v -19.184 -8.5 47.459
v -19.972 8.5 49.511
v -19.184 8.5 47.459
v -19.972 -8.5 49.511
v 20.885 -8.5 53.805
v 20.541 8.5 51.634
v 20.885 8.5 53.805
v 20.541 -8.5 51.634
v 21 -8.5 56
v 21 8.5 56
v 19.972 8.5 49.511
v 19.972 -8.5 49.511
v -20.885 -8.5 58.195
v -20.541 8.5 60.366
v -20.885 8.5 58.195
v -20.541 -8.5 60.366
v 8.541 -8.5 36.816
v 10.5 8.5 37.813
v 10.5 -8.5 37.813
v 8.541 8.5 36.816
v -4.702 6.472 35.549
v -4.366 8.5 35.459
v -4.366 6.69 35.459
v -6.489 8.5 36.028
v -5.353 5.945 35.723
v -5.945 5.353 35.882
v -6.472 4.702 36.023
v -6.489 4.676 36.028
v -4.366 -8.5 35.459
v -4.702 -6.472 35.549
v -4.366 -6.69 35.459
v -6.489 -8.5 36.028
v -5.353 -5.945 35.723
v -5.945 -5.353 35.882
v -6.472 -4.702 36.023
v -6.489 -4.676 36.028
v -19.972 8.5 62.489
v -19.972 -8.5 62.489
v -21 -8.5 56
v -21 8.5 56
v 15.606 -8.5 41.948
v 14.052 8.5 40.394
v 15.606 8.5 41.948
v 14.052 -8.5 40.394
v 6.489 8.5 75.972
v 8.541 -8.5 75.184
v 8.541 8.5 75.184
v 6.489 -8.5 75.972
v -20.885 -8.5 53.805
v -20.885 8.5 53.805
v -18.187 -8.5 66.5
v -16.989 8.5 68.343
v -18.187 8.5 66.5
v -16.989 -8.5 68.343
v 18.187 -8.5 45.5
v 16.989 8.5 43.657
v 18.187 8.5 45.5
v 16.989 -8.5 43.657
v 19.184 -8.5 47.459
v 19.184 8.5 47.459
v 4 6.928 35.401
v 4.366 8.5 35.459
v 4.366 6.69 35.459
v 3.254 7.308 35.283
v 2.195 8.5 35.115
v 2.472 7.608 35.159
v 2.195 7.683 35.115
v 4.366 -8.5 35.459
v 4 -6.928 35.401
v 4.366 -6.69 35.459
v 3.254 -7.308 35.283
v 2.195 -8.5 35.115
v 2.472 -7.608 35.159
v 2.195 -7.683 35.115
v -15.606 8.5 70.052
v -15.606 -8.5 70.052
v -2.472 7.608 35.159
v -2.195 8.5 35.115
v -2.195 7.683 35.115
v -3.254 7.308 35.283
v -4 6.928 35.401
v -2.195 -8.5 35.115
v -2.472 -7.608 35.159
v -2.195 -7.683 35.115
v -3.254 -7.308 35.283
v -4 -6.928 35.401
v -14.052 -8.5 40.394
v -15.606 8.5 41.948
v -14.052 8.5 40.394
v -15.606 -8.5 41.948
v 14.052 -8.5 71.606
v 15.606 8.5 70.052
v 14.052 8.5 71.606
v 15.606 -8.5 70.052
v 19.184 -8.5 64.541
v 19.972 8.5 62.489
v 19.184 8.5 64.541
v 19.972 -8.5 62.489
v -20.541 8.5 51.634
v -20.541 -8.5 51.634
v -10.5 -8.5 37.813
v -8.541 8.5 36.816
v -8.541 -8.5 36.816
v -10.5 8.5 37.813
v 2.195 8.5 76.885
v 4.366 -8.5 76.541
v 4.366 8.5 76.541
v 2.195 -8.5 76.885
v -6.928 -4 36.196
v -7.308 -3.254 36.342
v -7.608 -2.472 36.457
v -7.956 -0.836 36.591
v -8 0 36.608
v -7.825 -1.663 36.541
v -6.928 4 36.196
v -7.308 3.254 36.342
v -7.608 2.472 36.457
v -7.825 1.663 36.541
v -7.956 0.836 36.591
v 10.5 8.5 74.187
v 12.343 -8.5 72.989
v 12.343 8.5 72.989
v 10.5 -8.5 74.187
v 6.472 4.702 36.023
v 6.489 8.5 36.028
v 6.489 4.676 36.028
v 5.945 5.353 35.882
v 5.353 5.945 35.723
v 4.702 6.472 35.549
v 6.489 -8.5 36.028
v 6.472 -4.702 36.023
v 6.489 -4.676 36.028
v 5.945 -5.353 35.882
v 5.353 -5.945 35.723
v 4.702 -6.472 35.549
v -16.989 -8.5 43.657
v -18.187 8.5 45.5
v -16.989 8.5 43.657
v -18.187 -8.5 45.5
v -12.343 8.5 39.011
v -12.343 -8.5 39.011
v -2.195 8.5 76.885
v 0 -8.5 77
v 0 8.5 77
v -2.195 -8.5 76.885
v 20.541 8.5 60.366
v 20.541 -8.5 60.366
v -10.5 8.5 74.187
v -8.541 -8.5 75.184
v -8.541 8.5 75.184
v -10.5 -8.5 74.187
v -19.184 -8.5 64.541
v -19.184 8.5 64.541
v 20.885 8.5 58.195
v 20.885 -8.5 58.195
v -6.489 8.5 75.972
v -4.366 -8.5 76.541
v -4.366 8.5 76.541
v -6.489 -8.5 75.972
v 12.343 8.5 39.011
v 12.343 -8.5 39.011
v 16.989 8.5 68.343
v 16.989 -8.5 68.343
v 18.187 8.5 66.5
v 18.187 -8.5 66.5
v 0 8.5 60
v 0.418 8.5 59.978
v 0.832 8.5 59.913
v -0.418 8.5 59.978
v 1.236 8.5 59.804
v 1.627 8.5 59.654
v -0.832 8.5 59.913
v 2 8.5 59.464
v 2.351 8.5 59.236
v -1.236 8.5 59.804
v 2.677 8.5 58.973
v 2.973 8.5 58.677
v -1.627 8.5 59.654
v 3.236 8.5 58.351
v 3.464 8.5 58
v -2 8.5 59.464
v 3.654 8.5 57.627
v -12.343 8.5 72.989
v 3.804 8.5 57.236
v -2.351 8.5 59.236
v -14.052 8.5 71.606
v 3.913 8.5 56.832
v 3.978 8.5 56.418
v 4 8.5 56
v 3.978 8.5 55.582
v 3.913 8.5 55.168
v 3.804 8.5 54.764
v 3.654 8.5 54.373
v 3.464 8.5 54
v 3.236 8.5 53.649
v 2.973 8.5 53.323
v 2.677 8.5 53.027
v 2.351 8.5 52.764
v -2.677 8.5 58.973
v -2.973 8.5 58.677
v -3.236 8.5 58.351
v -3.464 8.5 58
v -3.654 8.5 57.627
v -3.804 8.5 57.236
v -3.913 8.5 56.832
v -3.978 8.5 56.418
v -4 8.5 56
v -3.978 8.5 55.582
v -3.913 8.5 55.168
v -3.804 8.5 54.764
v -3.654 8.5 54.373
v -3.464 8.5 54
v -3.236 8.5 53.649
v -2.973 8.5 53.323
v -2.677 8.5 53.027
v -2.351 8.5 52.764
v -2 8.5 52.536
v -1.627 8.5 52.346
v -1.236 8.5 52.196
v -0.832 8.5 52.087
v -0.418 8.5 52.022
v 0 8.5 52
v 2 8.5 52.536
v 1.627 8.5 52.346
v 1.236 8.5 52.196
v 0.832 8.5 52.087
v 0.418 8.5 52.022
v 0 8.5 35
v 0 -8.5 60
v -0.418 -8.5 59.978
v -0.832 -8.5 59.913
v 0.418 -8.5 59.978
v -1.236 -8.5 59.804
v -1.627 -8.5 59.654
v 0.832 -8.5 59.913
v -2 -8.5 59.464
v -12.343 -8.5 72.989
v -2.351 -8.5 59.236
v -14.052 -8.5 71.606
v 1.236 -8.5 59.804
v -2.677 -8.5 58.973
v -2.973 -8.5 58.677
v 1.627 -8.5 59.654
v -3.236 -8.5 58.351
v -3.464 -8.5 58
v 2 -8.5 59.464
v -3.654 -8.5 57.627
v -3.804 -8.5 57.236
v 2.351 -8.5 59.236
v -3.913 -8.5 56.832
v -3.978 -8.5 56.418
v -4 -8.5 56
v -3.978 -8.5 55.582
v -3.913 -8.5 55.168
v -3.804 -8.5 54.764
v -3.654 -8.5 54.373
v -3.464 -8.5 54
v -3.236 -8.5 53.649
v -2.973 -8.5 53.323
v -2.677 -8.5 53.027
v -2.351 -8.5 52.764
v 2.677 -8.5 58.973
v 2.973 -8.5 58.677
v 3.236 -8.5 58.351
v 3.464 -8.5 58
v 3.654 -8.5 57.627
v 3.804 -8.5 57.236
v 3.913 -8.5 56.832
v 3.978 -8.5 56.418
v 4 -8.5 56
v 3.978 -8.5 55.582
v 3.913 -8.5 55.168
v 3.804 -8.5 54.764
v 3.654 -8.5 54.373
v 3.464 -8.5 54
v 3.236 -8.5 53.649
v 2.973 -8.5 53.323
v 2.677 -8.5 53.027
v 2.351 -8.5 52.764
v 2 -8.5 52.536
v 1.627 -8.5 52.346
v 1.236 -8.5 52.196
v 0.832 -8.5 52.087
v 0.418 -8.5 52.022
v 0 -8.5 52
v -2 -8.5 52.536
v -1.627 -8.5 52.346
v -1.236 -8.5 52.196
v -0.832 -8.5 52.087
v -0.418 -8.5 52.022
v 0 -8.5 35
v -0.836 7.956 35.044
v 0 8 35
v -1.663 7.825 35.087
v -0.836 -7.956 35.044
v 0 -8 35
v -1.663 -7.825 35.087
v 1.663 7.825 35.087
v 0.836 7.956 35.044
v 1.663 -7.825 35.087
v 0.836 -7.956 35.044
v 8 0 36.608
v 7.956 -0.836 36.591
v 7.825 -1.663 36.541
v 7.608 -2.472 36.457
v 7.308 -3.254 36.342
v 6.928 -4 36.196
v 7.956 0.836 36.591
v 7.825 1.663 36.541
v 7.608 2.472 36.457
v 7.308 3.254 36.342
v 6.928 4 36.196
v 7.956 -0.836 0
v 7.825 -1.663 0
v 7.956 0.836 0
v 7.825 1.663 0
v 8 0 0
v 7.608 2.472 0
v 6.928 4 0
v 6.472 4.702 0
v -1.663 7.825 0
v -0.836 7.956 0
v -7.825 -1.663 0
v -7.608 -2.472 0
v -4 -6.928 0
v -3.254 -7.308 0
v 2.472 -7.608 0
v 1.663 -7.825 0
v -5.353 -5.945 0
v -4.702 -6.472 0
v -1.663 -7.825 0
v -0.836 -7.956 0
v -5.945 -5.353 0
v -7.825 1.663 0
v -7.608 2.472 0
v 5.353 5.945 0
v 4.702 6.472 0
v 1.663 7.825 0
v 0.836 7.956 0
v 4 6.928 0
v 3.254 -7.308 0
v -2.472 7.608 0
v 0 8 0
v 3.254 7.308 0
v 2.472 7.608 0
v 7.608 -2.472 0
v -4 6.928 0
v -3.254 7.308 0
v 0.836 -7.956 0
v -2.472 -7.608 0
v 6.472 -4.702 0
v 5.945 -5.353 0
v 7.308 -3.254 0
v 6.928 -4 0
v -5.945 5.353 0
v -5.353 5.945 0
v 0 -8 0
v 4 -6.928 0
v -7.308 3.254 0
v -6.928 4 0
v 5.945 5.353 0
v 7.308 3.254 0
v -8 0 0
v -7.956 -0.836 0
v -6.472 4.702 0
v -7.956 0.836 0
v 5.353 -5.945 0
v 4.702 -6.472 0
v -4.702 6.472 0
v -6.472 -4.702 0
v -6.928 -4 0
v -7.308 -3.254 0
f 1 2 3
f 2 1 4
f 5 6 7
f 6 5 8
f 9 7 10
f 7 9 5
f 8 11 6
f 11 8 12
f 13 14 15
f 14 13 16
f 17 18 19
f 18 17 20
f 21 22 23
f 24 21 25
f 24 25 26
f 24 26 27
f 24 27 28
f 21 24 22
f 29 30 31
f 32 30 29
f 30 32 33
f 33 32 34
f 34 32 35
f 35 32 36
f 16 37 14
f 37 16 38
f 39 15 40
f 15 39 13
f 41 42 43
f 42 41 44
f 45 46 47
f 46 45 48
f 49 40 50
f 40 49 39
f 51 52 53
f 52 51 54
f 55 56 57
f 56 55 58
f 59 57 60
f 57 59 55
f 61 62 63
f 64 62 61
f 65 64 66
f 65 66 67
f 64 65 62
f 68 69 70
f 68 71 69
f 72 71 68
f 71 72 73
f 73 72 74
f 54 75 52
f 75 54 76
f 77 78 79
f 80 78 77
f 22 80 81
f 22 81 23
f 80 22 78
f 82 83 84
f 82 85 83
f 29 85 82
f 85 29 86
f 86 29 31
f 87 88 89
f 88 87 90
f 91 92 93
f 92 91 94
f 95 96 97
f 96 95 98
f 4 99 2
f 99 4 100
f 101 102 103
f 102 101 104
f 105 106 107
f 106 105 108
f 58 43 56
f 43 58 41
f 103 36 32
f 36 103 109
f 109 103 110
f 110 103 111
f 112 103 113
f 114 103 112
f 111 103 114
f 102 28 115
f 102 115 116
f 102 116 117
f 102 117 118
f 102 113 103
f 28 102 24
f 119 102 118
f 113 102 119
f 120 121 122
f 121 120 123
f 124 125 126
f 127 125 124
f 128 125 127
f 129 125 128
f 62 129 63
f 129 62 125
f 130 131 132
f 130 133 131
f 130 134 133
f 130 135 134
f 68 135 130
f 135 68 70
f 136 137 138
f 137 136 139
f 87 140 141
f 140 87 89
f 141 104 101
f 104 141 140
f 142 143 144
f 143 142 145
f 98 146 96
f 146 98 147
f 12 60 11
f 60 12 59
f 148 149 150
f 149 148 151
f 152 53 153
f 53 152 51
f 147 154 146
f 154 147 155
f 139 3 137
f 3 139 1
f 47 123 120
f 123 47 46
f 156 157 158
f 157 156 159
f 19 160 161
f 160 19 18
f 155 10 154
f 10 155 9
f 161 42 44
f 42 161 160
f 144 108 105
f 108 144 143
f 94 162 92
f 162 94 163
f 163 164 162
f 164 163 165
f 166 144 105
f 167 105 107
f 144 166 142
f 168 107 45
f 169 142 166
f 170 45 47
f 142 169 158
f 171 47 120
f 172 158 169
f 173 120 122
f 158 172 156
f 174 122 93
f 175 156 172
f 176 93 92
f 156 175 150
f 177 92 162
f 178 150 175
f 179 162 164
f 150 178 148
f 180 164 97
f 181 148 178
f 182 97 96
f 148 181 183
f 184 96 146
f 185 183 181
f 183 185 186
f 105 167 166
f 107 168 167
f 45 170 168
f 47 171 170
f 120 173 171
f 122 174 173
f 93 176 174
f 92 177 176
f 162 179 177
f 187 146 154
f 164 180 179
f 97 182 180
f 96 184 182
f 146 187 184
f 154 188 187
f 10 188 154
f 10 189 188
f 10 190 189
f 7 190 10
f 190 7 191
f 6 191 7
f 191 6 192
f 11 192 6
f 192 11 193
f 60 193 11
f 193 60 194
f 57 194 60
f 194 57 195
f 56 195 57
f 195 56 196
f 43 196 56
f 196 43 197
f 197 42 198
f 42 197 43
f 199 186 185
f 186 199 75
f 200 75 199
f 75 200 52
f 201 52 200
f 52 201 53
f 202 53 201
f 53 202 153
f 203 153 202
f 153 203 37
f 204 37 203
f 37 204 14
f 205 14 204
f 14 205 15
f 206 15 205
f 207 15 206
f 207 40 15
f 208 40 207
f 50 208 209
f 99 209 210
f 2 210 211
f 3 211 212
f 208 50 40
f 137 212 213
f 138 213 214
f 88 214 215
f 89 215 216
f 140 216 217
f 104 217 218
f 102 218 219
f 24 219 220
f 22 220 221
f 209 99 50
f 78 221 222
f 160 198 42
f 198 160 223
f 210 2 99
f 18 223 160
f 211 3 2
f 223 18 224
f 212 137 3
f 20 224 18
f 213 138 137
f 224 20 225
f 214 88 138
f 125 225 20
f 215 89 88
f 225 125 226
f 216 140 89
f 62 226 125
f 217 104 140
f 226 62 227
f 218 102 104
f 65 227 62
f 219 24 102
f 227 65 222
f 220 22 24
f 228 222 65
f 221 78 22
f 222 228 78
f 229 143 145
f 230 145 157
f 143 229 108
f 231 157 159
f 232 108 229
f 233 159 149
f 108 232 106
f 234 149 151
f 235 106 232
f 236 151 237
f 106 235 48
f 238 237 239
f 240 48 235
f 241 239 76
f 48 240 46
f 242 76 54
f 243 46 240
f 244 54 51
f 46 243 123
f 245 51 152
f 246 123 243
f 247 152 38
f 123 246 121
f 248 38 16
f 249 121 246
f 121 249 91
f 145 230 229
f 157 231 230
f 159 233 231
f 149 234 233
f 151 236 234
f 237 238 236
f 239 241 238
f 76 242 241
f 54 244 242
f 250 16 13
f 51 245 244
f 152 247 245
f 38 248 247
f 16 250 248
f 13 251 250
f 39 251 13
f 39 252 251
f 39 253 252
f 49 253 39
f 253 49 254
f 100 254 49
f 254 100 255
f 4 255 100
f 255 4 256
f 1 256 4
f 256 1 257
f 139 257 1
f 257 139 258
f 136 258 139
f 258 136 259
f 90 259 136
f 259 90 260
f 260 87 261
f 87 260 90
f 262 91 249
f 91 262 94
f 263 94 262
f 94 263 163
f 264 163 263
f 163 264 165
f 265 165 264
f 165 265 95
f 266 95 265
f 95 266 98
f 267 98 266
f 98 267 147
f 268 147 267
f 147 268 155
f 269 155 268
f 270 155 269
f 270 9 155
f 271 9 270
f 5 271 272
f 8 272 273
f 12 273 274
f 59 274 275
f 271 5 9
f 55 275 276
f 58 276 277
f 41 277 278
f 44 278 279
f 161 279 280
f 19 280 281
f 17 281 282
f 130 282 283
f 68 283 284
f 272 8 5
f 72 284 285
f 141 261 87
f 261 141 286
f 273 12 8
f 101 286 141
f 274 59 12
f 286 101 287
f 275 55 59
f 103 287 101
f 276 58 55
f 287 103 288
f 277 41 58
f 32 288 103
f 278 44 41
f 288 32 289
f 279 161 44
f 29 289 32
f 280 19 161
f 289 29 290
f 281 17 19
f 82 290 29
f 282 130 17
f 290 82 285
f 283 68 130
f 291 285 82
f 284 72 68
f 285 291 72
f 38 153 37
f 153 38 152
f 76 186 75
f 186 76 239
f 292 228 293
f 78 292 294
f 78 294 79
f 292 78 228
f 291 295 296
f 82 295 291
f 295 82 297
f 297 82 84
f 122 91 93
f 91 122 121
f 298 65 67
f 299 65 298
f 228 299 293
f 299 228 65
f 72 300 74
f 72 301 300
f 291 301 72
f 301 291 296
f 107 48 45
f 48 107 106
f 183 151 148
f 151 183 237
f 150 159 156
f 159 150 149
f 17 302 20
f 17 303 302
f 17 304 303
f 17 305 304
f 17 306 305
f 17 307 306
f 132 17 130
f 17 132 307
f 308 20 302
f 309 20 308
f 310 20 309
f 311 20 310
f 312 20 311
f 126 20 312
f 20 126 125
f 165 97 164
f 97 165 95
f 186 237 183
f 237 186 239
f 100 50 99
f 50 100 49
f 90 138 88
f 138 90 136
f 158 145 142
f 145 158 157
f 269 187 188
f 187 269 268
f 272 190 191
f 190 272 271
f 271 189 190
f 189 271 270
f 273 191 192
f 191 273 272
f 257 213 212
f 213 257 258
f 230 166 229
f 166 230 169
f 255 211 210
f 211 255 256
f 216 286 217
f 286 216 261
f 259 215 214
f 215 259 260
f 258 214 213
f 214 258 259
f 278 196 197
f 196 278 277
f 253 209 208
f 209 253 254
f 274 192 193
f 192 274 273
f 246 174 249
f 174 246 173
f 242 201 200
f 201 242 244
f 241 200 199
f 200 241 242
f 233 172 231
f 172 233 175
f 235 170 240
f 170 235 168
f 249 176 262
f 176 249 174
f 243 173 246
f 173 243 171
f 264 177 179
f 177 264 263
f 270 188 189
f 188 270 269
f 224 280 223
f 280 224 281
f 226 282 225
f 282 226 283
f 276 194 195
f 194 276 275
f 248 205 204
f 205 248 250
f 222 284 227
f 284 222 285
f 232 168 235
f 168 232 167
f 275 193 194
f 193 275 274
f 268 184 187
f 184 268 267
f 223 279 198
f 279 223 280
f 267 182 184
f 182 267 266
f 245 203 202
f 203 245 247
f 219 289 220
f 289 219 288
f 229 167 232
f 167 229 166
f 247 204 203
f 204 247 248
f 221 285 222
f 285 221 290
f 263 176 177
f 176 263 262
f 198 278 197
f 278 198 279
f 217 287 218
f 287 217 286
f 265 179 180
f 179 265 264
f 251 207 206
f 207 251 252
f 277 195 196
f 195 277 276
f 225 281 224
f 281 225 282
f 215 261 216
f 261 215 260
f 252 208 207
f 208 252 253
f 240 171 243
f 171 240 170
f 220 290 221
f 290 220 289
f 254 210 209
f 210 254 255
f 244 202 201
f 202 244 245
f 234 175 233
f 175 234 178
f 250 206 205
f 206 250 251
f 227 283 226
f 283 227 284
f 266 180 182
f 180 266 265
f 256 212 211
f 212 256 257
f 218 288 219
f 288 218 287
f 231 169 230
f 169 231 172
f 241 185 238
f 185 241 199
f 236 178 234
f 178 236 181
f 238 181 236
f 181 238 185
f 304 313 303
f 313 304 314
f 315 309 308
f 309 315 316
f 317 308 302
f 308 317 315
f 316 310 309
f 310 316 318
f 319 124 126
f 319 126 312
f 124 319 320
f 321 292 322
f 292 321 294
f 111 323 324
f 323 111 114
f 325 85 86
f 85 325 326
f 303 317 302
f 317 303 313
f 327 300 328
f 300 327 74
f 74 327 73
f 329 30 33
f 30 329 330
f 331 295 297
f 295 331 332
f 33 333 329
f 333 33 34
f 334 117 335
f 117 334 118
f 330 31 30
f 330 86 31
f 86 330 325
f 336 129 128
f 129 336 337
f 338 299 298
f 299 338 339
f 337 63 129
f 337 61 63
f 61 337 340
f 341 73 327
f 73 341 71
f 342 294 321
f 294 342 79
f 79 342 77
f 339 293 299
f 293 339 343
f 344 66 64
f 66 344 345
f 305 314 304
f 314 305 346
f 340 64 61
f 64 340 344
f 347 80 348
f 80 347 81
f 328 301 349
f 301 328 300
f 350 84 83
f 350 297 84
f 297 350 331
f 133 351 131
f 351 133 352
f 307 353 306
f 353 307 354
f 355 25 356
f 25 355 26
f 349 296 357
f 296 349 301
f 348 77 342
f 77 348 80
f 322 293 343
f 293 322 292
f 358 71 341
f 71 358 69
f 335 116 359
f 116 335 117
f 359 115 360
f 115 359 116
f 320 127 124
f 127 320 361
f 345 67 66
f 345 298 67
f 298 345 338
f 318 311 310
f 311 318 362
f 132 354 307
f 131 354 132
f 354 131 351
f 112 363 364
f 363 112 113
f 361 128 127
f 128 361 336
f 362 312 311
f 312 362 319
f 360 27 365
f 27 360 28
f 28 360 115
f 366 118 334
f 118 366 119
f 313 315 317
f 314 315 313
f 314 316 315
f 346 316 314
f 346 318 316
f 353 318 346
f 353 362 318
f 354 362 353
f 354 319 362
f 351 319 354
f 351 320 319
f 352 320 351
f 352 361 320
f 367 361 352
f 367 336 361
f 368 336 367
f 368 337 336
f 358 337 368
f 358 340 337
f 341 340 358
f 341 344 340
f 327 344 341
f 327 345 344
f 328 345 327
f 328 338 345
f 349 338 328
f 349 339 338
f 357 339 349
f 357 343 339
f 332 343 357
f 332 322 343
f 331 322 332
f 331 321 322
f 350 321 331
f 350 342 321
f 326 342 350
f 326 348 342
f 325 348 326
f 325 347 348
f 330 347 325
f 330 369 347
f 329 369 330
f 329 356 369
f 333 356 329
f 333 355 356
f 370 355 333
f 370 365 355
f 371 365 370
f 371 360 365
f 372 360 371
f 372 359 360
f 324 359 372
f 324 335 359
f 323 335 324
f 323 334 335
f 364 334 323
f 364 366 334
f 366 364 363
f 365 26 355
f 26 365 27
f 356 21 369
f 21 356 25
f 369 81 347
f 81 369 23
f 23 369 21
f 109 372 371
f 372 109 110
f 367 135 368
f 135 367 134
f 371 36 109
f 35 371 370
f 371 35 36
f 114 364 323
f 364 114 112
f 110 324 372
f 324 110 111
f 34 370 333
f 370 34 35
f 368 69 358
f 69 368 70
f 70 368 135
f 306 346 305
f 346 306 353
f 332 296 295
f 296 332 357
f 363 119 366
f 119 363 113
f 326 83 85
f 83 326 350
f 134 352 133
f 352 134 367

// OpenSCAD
// Flat-eye bolt with a smooth shaft.
$fn = 60;
eps = 0.02;
shaft_d = 16;
shaft_l = 36;
eye_outer_d = 42;
eye_inner_d = eye_outer_d - 2 * 17;
eye_t = 17;
module eye() {
    translate([0, -eye_t / 2, shaft_l + eye_outer_d / 2 - 1]) rotate([-90, 0, 0])
        difference() { cylinder(d = eye_outer_d, h = eye_t); translate([0, 0, -eps]) cylinder(d = eye_inner_d, h = eye_t + 2 * eps); }
}
union() { cylinder(d = shaft_d, h = shaft_l + 2); eye(); }
